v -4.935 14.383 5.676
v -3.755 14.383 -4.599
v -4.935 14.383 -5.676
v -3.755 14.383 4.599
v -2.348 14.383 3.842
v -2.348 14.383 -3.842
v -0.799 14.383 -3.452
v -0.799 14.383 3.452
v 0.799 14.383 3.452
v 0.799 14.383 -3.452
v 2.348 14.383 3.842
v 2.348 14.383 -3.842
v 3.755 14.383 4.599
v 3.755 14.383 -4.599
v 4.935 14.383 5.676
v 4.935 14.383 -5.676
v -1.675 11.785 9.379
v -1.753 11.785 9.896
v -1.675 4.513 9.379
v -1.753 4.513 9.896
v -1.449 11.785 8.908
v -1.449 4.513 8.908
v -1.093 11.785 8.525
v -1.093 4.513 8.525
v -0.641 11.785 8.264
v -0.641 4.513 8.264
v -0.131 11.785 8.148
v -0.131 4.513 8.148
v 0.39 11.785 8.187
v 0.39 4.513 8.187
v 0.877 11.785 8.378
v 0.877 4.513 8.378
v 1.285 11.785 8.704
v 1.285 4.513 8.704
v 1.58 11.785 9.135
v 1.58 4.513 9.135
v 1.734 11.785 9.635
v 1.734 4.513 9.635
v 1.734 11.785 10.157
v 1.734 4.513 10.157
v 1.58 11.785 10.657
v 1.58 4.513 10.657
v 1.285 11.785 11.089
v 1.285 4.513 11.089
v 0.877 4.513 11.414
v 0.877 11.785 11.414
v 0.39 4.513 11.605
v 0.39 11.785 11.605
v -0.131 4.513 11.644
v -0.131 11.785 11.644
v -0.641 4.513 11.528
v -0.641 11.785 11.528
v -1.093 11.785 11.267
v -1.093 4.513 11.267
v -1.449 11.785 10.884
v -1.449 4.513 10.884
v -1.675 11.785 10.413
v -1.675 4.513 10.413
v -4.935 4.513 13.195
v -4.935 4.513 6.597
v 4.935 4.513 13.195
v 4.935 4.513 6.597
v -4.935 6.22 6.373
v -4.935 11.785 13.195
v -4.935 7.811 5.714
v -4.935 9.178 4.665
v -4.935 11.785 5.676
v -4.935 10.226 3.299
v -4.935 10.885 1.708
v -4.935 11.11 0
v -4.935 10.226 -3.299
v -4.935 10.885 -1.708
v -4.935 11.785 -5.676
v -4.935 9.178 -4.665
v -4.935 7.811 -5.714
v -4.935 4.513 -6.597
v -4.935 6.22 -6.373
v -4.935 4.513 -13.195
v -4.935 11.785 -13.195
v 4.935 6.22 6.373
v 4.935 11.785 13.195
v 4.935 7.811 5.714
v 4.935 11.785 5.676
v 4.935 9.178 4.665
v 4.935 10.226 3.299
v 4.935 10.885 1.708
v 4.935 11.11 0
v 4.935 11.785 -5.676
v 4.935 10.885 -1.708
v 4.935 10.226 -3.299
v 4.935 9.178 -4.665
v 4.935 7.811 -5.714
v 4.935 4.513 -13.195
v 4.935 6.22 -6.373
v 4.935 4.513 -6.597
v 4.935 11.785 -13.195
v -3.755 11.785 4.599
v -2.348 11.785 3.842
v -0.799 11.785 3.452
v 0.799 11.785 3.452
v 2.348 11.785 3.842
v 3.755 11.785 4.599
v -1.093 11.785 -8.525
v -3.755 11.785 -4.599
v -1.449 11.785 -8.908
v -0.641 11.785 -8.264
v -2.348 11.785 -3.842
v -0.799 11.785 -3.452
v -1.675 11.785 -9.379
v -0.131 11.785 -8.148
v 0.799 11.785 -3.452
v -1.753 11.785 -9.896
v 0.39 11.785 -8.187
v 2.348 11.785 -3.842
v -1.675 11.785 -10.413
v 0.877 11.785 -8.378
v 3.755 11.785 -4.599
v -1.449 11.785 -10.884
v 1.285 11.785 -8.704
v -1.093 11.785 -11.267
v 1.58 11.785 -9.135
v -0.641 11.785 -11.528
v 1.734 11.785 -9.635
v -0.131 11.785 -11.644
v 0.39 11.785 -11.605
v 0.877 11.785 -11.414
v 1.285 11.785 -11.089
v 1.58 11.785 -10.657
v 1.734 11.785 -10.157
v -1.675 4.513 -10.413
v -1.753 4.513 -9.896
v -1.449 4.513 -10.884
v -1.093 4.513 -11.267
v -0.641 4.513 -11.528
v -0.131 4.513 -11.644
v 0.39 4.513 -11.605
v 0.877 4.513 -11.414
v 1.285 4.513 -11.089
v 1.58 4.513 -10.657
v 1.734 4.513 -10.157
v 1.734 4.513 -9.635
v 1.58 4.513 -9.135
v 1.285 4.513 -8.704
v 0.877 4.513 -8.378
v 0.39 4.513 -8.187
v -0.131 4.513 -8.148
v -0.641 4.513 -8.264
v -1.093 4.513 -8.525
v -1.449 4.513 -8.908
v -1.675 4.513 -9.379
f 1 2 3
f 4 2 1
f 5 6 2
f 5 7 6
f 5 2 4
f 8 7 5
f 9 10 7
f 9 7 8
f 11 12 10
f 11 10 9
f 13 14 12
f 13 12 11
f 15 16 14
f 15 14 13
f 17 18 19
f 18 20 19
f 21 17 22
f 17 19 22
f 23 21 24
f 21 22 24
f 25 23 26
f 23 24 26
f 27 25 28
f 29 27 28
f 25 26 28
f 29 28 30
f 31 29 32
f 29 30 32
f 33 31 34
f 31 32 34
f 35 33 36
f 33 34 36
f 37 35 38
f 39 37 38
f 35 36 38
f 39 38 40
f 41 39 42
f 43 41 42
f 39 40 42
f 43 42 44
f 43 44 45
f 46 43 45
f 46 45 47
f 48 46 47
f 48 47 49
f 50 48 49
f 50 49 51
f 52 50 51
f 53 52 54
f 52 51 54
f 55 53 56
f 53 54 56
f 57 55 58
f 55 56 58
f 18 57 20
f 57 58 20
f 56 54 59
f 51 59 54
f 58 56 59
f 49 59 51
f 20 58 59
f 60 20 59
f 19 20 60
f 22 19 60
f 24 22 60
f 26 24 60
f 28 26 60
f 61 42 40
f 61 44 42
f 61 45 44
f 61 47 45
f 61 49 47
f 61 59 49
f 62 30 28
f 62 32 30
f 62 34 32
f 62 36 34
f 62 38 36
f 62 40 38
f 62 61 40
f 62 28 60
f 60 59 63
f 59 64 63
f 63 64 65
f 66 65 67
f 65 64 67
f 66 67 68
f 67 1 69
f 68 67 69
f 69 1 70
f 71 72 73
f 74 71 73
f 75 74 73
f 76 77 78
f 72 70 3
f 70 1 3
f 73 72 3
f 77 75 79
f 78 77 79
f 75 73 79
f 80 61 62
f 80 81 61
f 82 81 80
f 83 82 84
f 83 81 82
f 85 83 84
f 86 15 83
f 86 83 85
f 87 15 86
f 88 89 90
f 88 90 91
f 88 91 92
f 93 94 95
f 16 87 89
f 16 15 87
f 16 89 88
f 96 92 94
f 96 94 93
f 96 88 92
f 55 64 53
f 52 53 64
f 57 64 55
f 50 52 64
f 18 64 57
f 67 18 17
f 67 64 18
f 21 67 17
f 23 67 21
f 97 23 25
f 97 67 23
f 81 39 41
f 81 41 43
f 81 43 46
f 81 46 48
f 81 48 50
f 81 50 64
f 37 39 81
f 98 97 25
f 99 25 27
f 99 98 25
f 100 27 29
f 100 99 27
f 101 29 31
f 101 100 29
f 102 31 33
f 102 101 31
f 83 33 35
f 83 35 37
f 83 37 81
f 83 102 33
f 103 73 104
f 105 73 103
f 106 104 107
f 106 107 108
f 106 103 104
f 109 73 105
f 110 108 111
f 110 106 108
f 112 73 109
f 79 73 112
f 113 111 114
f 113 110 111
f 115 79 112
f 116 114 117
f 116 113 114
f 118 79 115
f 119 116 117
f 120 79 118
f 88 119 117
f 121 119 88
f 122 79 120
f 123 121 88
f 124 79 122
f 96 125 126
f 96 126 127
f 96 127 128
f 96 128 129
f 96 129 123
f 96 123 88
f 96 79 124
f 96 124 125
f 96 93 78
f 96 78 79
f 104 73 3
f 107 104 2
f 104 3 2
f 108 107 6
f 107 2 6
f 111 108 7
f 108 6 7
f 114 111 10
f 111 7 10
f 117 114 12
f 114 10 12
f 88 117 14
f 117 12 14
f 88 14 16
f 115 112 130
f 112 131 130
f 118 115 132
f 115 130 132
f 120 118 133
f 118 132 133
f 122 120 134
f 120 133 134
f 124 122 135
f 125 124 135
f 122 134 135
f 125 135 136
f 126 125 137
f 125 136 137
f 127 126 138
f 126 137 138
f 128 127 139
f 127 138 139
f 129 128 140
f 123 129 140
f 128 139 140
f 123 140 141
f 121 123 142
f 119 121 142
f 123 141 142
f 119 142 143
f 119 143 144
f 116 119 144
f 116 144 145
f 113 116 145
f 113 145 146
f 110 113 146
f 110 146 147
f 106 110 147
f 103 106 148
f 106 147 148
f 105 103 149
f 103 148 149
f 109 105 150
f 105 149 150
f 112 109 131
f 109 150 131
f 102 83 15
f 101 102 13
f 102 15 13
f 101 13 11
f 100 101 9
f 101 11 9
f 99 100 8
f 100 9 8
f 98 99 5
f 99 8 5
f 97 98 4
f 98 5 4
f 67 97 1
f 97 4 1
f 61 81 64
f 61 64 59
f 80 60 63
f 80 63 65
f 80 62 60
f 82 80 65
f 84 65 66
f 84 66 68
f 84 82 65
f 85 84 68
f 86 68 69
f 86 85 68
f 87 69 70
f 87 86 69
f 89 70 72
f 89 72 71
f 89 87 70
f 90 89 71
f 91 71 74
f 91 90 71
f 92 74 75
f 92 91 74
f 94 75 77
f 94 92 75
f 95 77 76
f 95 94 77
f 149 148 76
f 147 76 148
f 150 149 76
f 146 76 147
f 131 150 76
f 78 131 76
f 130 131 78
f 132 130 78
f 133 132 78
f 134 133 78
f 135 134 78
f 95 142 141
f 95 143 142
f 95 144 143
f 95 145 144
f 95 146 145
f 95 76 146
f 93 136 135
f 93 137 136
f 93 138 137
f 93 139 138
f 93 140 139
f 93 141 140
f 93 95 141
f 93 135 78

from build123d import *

# Parameters (mm, degrees)
BOSS_EXTRUDE1_DEPTH                           = 9.5
CBORE_FOR_M12_HEX_HEAD_CAP_SCREW2_D           = 6.75
CBORE_FOR_M12_HEX_HEAD_CAP_SCREW2_CBORE_D     = 25
CBORE_FOR_M12_HEX_HEAD_CAP_SCREW2_CBORE_DEPTH = 5
SCALE1_SCALE                                  = 0.51948


with BuildPart() as part:
    # Sketch1 → Boss-Extrude1 (new, symmetric)
    with BuildSketch(Plane(origin=(0, 0, 0), x_dir=(0, 0, -1), z_dir=(1, 0, 0))):
        with BuildLine():
            ThreePointArc((-12.7, 0), (0, 12.7), (12.7, 0))
            Line((12.7, 0), (25.4, 0))
            Line((25.4, 0), (25.4, 19))
            Line((25.4, 19), (-25.4, 19))
            Line((-25.4, 19), (-25.4, 0))
            Line((-25.4, 0), (-12.7, 0))
        make_face()
    extrude(amount=BOSS_EXTRUDE1_DEPTH, both=True)

    # CBORE for M12 Hex Head Cap Screw2 (through all)
    with Locations(Plane(origin=(0, 19, 0), x_dir=(1, 0, 0), z_dir=(0, 1, 0))):
        with Locations((0, 19.05), (0, -19.05)):
            CounterBoreHole(CBORE_FOR_M12_HEX_HEAD_CAP_SCREW2_D / 2, CBORE_FOR_M12_HEX_HEAD_CAP_SCREW2_CBORE_D / 2, CBORE_FOR_M12_HEX_HEAD_CAP_SCREW2_CBORE_DEPTH)


with BuildPart() as part_1:
    # Scale1: scaled about (0, 9.391105983, 0)
    add(part.part.scale(SCALE1_SCALE).moved(Location((0, 4.512614247, 0))))


solid = part_1.part
